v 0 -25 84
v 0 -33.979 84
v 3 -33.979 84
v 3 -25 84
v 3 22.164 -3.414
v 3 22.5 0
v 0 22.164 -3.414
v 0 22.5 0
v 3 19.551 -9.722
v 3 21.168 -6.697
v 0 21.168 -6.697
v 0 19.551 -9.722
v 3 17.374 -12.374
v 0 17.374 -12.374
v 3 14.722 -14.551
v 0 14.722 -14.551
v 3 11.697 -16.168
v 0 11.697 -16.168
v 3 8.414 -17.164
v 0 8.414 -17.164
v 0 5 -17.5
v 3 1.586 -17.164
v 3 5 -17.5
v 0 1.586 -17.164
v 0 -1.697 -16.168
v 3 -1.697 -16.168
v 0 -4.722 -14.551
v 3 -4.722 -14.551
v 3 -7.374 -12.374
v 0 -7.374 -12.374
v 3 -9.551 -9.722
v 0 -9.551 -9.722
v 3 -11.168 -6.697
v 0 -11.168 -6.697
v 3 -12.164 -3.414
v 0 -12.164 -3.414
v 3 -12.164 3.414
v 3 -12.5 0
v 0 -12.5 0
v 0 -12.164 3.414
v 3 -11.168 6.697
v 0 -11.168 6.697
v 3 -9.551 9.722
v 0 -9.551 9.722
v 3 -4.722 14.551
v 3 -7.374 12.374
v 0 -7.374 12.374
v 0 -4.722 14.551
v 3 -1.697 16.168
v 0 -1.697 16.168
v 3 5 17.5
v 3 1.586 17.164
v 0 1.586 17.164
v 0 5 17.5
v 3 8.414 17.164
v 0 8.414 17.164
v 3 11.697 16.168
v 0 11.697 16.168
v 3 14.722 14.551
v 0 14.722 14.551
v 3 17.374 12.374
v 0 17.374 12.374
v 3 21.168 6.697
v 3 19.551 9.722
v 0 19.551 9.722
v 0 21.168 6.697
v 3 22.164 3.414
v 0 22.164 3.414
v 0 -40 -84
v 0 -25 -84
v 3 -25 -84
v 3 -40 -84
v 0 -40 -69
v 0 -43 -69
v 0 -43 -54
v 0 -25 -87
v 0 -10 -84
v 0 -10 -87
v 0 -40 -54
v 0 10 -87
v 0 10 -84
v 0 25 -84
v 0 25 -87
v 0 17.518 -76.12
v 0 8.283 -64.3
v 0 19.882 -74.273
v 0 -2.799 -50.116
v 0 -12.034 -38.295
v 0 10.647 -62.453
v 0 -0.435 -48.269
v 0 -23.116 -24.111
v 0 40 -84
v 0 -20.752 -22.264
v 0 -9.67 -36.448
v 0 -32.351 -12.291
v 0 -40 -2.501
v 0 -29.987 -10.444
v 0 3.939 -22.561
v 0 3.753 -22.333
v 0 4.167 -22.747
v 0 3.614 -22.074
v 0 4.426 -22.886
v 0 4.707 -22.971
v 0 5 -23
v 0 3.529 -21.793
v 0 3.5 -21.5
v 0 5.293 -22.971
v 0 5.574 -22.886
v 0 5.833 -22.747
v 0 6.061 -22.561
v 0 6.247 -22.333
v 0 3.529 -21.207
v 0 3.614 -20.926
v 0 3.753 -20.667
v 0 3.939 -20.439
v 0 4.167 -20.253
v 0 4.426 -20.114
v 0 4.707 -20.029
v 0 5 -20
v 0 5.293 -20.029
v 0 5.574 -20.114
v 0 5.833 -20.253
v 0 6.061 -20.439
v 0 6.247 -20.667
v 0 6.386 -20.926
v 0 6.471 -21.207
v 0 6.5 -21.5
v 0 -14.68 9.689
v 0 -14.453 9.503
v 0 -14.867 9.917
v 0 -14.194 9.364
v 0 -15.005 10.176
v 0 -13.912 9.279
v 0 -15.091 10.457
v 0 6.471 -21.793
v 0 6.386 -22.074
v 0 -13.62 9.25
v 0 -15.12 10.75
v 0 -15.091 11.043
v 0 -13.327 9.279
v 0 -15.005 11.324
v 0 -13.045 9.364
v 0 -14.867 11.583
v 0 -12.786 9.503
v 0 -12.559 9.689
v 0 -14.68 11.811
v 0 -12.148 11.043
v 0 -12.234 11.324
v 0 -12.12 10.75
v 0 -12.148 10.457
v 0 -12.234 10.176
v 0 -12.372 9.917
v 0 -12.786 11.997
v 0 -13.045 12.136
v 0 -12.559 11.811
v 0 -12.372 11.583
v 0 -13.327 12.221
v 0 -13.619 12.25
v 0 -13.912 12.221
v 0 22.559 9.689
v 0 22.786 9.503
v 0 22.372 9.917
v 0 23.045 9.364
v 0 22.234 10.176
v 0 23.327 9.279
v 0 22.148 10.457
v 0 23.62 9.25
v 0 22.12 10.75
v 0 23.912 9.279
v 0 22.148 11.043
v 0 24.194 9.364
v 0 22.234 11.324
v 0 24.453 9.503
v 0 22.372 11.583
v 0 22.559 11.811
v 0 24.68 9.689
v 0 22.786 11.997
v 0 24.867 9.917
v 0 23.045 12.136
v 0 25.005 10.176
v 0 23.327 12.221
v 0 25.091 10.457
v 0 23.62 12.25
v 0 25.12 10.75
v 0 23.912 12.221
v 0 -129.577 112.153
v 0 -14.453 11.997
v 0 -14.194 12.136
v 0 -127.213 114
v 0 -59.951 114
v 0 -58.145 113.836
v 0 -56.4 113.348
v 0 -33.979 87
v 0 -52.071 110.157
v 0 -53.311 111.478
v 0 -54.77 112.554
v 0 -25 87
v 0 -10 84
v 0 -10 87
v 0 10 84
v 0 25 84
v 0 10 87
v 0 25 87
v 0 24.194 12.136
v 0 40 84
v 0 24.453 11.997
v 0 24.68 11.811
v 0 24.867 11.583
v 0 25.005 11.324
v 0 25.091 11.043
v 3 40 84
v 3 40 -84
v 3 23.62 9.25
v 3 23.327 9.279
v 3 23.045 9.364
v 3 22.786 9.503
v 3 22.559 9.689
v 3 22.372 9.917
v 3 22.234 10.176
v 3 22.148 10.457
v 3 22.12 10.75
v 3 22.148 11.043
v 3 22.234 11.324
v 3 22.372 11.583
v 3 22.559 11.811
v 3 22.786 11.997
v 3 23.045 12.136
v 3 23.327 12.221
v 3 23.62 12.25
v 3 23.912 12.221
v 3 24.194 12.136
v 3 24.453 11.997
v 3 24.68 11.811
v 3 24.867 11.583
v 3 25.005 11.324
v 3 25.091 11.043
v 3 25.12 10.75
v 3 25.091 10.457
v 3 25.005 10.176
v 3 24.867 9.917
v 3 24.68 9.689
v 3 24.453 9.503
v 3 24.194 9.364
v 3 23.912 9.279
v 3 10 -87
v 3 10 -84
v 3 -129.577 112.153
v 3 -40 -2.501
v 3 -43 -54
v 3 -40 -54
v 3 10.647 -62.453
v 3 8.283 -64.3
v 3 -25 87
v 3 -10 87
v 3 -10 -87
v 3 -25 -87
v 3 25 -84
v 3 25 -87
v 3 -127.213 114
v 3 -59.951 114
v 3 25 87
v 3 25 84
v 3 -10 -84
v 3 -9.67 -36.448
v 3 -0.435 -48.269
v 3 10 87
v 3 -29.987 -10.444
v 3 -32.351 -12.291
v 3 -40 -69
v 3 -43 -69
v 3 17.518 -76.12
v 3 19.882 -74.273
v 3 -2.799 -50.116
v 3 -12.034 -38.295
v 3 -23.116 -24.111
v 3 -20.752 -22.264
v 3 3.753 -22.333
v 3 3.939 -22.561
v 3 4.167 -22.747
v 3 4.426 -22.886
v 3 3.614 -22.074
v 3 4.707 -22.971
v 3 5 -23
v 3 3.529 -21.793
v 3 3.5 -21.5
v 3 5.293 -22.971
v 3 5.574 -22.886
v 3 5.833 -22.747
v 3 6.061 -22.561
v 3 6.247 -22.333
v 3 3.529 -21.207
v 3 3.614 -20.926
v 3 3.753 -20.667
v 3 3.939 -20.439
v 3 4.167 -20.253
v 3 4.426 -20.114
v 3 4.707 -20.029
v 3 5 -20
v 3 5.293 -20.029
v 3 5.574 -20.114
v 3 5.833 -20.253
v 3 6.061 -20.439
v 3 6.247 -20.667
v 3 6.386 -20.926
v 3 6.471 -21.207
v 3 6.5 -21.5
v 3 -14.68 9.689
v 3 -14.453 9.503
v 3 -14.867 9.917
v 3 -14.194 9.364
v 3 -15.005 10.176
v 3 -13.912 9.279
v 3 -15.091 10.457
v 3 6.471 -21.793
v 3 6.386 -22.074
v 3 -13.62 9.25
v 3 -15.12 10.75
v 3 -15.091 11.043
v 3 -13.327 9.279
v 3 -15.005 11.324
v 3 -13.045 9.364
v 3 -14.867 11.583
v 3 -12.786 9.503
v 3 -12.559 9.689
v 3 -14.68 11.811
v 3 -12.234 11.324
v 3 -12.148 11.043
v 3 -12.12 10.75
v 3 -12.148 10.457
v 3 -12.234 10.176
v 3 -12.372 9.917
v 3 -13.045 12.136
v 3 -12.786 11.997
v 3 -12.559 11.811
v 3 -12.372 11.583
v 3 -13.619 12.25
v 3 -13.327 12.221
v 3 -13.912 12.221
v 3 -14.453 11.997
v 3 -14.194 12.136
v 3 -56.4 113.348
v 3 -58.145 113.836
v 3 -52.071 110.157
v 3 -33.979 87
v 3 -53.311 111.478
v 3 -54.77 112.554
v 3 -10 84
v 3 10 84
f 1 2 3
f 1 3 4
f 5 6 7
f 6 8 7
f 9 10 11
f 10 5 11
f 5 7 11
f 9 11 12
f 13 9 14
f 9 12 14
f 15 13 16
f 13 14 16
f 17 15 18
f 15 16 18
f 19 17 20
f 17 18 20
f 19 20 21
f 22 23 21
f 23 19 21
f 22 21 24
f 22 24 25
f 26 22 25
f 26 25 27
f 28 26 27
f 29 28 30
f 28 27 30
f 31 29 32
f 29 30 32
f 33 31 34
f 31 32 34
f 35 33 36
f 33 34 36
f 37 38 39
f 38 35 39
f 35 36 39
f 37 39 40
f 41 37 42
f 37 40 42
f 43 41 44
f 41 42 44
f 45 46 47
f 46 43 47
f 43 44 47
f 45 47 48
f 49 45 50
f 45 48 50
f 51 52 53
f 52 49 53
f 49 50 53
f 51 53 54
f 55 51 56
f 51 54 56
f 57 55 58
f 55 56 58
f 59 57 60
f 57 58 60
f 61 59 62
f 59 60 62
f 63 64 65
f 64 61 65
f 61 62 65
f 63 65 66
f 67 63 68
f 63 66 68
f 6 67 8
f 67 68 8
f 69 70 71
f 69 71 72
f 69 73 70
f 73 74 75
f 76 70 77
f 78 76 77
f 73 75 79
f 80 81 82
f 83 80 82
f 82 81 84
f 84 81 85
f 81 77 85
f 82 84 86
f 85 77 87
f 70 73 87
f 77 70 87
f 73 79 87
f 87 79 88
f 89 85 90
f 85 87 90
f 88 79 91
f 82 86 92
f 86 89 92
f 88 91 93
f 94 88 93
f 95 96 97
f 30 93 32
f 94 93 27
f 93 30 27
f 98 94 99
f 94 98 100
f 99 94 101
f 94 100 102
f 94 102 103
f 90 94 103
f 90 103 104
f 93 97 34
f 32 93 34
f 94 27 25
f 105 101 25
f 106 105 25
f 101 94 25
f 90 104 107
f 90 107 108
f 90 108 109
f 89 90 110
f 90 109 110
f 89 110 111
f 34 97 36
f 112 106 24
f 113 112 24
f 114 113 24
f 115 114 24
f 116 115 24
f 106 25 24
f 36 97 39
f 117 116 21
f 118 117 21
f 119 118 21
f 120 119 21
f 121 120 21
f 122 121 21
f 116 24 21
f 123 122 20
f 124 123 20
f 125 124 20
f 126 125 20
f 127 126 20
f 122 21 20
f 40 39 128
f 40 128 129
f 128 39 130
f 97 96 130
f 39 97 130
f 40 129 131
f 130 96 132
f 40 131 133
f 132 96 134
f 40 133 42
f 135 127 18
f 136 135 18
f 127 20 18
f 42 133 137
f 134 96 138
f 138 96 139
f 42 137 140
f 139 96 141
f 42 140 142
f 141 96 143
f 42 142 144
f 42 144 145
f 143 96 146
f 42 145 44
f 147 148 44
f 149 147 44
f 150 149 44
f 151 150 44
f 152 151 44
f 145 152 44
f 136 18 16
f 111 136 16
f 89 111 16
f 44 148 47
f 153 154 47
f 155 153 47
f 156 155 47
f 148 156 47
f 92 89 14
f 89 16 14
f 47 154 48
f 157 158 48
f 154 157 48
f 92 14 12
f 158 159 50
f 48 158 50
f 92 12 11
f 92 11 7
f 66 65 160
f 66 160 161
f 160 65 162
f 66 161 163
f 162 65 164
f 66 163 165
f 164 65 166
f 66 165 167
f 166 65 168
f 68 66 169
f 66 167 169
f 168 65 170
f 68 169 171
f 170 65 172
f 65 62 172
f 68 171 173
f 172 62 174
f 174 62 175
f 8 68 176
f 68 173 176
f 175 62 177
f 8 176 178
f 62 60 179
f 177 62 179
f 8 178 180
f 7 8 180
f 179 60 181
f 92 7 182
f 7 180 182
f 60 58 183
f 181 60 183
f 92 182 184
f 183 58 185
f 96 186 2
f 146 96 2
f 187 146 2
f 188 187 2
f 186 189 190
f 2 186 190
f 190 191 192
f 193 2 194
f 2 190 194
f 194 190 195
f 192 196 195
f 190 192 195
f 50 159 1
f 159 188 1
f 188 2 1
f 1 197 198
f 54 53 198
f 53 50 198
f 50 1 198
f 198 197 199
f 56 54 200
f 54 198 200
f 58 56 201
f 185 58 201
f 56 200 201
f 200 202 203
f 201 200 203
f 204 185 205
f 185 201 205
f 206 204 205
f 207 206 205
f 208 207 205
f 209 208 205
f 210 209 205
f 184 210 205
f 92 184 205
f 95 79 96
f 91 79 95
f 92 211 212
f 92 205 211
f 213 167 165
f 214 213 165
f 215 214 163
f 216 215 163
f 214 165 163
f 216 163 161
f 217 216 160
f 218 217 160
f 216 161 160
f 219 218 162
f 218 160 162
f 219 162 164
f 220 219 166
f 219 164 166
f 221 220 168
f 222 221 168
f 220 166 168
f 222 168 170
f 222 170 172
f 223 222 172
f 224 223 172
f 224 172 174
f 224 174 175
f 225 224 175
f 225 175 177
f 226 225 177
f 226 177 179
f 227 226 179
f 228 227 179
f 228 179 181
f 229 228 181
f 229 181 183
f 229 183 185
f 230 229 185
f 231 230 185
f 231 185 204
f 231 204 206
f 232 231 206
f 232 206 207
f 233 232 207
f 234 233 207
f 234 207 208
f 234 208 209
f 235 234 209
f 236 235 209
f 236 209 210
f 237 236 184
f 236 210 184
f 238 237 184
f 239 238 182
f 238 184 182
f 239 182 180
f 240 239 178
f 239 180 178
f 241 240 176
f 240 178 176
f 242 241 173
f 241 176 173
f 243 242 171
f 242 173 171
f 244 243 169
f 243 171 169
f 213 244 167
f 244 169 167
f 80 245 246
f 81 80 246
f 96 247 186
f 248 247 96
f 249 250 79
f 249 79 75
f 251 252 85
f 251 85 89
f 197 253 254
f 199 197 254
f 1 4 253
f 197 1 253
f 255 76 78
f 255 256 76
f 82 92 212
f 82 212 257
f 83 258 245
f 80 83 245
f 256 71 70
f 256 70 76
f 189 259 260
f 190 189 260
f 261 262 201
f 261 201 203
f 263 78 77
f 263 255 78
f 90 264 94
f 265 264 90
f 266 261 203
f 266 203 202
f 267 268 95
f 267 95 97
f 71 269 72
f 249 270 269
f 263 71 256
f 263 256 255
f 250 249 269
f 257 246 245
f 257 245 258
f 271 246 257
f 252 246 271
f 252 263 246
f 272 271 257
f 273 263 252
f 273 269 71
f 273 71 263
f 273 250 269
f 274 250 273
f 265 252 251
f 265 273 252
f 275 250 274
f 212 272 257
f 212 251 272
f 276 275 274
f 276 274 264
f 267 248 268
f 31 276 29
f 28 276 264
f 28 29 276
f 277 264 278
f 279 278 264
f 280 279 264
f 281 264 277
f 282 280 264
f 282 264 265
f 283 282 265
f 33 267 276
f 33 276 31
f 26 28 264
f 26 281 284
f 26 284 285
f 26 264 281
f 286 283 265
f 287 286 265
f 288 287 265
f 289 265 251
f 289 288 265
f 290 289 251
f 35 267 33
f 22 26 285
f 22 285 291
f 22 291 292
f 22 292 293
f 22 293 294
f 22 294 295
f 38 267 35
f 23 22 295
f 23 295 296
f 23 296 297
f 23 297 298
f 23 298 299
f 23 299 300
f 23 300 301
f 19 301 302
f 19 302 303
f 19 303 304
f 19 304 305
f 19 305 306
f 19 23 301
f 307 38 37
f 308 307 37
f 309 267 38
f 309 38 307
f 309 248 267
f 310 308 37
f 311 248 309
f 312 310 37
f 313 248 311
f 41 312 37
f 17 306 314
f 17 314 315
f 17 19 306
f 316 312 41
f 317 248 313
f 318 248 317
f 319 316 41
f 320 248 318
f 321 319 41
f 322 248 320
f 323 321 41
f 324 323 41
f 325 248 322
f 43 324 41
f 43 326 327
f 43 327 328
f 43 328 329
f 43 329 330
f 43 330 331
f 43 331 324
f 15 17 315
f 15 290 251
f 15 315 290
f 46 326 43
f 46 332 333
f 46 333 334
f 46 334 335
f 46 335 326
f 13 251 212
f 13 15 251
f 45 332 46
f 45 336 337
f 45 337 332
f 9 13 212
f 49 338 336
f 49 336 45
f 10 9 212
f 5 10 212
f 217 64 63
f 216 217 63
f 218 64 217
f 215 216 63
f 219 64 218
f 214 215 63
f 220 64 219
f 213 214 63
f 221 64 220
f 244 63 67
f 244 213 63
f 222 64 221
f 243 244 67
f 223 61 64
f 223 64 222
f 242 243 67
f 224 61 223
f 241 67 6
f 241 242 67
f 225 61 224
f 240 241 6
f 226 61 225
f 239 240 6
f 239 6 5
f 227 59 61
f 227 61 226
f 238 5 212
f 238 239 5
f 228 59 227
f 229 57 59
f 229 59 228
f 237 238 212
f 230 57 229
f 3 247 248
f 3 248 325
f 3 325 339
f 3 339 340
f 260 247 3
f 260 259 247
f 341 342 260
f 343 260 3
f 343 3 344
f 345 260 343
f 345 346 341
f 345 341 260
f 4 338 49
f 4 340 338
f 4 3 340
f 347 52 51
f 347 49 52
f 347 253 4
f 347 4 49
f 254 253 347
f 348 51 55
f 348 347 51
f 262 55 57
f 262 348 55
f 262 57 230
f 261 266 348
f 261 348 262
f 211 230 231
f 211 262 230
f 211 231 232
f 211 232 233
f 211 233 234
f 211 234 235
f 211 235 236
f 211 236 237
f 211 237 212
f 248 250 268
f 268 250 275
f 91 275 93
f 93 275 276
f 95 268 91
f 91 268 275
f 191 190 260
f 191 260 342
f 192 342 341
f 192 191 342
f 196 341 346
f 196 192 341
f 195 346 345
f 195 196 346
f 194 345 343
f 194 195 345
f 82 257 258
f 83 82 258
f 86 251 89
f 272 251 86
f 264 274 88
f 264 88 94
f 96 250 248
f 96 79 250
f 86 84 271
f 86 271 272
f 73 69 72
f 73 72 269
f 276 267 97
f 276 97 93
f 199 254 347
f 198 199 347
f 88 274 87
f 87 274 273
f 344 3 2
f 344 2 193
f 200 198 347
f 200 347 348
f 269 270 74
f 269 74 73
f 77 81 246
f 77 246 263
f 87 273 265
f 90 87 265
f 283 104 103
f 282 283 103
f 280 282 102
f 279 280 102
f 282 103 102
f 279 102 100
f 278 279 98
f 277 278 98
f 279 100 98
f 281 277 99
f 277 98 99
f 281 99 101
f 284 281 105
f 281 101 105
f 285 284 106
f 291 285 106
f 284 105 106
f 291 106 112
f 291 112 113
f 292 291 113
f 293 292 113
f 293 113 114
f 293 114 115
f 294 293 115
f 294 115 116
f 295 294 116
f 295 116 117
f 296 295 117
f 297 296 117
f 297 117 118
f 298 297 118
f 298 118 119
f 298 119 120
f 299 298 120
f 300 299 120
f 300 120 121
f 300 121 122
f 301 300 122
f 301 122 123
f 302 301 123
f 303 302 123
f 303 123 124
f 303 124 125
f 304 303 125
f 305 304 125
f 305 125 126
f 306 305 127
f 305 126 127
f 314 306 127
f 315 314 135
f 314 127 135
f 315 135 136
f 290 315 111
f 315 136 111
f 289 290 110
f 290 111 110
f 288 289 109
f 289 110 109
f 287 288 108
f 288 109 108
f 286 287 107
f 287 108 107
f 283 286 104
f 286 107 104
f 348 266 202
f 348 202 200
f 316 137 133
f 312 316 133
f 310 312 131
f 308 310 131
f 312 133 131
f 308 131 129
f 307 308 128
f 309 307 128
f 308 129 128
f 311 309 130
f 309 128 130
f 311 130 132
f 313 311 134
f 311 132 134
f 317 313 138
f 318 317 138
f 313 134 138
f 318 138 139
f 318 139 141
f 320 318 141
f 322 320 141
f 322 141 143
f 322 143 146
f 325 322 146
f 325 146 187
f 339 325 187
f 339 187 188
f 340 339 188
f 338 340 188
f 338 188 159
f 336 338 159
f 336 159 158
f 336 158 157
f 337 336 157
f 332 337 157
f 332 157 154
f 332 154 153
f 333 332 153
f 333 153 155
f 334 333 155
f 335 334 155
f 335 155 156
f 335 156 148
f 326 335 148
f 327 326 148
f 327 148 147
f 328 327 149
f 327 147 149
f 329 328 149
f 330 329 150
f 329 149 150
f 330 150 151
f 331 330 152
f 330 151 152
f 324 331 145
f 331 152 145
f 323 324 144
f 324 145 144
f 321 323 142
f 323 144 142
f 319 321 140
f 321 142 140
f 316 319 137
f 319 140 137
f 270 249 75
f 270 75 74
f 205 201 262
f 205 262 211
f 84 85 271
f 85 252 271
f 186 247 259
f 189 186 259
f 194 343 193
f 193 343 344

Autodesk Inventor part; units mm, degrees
ref_plane "YZ Plane" through (0, 0, 0) normal (1, 0, 0) x (0, 1, 0)
ref_plane "XZ Plane" through (0, 0, 0) normal (0, 1, 0) x (-1, 0, 0)
ref_plane "XY Plane" through (0, 0, 0) normal (0, 0, 1) x (1, 0, 0)
sketch "Sketch1" plane through (0, 0, 0) normal (1, 0, 0) x (0, 1, 0)
  line L0 (-40, 84) -> (40, 84)
  line L1 (40, 84) -> (40, -84)
  line L2 (40, -84) -> (-40, -84)
  line L3 (-40, -84) -> (-40, 84)
  line L4 (-40, 84) -> (40, -84) construction
  line L5 (40, 84) -> (-40, -84) construction
  circle A0 centre (5, 0) radius 17.5
  point P0 (0, 0)
  dimension "d0" = 35
  dimension "d5" = 35
  dimension "d6" = 80
  dimension "d7" = 168
  dimension "d8" = 84
extrude "Extrusion1" add sketch "Sketch1" along normal blind 3
sketch "Sketch2" plane through (3, 0, 0) normal (1, 0, 0) x (0, 0, -1)
  circle A0 centre (0, 5) radius 17.5 projected
  circle A1 centre (0, 5) radius 21.5 construction
  line L0 (0, -66.71) -> (0, 54.4228) construction
  line L1 (0, 5) -> (51.042, 5) construction
  point P0 (0, 0)
  point P1 (21.5, 5)
  point P2 (-10.75, 23.6195)
  point P3 (-10.75, -13.6195)
  dimension "d11" = 43
  dimension "d14" = 360
hole "Hole1" at (3, 5, -21.5) at (3, 23.6195, 10.75) at (3, -13.6195, 10.75) direction (-1, 0, 0) diameter 3 depth 10 tip angle 118
sketch "Sketch5" plane through (3, 0, 0) normal (1, 0, 0) x (0, 0, -1)
  circle A0 centre (0, 5) radius 17.5 projected
  circle A1 centre (0, 5) radius 31 construction
  line L0 (-114, -127.2132) -> (84, 27.4814)
  line L1 (84, -40) -> (84, 40) projected
  line L2 (-84, -40) -> (84, -40) projected
  line L3 (-112.153, -129.5772) -> (84, 23.6743)
  line L4 (76.1199, 17.5177) -> (74.2729, 19.8817)
  line L5 (64.2997, 8.2828) -> (62.4527, 10.6468)
  line L6 (-84, 40) -> (-84, -40) projected
  line L7 (-114, -55.0733) -> (-87, -33.9786)
  line L8 (-112.153, -129.5772) -> (-114, -127.2132)
  line L9 (-114, -127.2132) -> (-114, -55.0733)
  line L10 (84, 40) -> (-84, 40) projected
  line L11 (38.2954, -12.034) -> (36.4484, -9.67)
  line L12 (50.1155, -2.7991) -> (48.2686, -0.4351)
  line L13 (12.291, -32.3509) -> (10.444, -29.9868)
  line L14 (24.1112, -23.116) -> (22.2642, -20.7519)
  line L15 (-84, -33.9786) -> (-87, -33.9786)
  line L16 (-87, -33.9786) -> (-87, 40) construction
  line L17 (-84, 40) -> (-87, 40) construction
  point P0 (0, 0)
  point P1 (11.0887, -29.6815)
  point P2 (12.9357, -32.0456)
  point P3 (2.5006, -40)
  dimension "d24" = 62
  dimension "d25" = 38
  dimension "d27" = 3
  dimension "d28" = 10
  dimension "d33" = 30
  dimension "d37" = 15
  dimension "d40" = 3
  dimension "d43" = 33
  dimension "d54" = 3
  dimension "d56" = 55
extrude "Extrusion2" cut sketch "Sketch5" against normal blind 10 contours L0 L14 L3 L13 | L0 L12 L3 L11 | L0 L4 L3 L5
extrude "Extrusion3" add sketch "Sketch5" against normal up to surface (3 mm away) contours L2 L3 L8 L0 | L0 L9 L7 L15 L6 L2
fillet "Fillet1" radius 10 1 edges at (1.5, -55.0733, 114)
sketch "Sketch8" plane through (3, 0, 0) normal (1, 0, 0) x (0, 0, -1)
  line L0 (84, -25) -> (87, -25)
  line L1 (87, -25) -> (87, -10)
  line L2 (87, -10) -> (84, -10)
  line L3 (84, -10) -> (84, -25)
  line L4 (84, -40) -> (84, 40) projected
  line L5 (84, -40) -> (84, 40) projected
  line L6 (84, 0) -> (0, 0) construction
  line L7 (84, 25) -> (87, 25)
  line L8 (87, 25) -> (87, 10)
  line L9 (87, 10) -> (84, 10)
  line L10 (84, 10) -> (84, 25)
  line L11 (84, 40) -> (-84, 40) construction
  line L12 (0, 40) -> (0, 0) construction
  line L13 (-84, -25) -> (-87, -25)
  line L14 (-87, -25) -> (-87, -10)
  line L15 (-87, -10) -> (-84, -10)
  line L16 (-84, -10) -> (-84, -25)
  line L17 (-87, 25) -> (-87, 10)
  line L18 (-87, 10) -> (-84, 10)
  line L19 (-84, 25) -> (-87, 25)
  line L20 (-84, 10) -> (-84, 25)
  line L21 (69, -40) -> (54, -40)
  line L22 (54, -40) -> (54, -43)
  line L23 (54, -43) -> (69, -43)
  line L24 (69, -43) -> (69, -40)
  line L25 (2.5006, -40) -> (84, -40) projected
  point P0 (-84, 0)
  dimension "d57" = 3
  dimension "d58" = 15
  dimension "d59" = 15
  dimension "d62" = 3
  dimension "d63" = 15
  dimension "d64" = 15
extrude "Extrusion5" add sketch "Sketch8" against normal up to surface (3 mm away)
equation "\"d8\" = 0.5 * d7"
properties part number "Soporte_Rodamientos"
